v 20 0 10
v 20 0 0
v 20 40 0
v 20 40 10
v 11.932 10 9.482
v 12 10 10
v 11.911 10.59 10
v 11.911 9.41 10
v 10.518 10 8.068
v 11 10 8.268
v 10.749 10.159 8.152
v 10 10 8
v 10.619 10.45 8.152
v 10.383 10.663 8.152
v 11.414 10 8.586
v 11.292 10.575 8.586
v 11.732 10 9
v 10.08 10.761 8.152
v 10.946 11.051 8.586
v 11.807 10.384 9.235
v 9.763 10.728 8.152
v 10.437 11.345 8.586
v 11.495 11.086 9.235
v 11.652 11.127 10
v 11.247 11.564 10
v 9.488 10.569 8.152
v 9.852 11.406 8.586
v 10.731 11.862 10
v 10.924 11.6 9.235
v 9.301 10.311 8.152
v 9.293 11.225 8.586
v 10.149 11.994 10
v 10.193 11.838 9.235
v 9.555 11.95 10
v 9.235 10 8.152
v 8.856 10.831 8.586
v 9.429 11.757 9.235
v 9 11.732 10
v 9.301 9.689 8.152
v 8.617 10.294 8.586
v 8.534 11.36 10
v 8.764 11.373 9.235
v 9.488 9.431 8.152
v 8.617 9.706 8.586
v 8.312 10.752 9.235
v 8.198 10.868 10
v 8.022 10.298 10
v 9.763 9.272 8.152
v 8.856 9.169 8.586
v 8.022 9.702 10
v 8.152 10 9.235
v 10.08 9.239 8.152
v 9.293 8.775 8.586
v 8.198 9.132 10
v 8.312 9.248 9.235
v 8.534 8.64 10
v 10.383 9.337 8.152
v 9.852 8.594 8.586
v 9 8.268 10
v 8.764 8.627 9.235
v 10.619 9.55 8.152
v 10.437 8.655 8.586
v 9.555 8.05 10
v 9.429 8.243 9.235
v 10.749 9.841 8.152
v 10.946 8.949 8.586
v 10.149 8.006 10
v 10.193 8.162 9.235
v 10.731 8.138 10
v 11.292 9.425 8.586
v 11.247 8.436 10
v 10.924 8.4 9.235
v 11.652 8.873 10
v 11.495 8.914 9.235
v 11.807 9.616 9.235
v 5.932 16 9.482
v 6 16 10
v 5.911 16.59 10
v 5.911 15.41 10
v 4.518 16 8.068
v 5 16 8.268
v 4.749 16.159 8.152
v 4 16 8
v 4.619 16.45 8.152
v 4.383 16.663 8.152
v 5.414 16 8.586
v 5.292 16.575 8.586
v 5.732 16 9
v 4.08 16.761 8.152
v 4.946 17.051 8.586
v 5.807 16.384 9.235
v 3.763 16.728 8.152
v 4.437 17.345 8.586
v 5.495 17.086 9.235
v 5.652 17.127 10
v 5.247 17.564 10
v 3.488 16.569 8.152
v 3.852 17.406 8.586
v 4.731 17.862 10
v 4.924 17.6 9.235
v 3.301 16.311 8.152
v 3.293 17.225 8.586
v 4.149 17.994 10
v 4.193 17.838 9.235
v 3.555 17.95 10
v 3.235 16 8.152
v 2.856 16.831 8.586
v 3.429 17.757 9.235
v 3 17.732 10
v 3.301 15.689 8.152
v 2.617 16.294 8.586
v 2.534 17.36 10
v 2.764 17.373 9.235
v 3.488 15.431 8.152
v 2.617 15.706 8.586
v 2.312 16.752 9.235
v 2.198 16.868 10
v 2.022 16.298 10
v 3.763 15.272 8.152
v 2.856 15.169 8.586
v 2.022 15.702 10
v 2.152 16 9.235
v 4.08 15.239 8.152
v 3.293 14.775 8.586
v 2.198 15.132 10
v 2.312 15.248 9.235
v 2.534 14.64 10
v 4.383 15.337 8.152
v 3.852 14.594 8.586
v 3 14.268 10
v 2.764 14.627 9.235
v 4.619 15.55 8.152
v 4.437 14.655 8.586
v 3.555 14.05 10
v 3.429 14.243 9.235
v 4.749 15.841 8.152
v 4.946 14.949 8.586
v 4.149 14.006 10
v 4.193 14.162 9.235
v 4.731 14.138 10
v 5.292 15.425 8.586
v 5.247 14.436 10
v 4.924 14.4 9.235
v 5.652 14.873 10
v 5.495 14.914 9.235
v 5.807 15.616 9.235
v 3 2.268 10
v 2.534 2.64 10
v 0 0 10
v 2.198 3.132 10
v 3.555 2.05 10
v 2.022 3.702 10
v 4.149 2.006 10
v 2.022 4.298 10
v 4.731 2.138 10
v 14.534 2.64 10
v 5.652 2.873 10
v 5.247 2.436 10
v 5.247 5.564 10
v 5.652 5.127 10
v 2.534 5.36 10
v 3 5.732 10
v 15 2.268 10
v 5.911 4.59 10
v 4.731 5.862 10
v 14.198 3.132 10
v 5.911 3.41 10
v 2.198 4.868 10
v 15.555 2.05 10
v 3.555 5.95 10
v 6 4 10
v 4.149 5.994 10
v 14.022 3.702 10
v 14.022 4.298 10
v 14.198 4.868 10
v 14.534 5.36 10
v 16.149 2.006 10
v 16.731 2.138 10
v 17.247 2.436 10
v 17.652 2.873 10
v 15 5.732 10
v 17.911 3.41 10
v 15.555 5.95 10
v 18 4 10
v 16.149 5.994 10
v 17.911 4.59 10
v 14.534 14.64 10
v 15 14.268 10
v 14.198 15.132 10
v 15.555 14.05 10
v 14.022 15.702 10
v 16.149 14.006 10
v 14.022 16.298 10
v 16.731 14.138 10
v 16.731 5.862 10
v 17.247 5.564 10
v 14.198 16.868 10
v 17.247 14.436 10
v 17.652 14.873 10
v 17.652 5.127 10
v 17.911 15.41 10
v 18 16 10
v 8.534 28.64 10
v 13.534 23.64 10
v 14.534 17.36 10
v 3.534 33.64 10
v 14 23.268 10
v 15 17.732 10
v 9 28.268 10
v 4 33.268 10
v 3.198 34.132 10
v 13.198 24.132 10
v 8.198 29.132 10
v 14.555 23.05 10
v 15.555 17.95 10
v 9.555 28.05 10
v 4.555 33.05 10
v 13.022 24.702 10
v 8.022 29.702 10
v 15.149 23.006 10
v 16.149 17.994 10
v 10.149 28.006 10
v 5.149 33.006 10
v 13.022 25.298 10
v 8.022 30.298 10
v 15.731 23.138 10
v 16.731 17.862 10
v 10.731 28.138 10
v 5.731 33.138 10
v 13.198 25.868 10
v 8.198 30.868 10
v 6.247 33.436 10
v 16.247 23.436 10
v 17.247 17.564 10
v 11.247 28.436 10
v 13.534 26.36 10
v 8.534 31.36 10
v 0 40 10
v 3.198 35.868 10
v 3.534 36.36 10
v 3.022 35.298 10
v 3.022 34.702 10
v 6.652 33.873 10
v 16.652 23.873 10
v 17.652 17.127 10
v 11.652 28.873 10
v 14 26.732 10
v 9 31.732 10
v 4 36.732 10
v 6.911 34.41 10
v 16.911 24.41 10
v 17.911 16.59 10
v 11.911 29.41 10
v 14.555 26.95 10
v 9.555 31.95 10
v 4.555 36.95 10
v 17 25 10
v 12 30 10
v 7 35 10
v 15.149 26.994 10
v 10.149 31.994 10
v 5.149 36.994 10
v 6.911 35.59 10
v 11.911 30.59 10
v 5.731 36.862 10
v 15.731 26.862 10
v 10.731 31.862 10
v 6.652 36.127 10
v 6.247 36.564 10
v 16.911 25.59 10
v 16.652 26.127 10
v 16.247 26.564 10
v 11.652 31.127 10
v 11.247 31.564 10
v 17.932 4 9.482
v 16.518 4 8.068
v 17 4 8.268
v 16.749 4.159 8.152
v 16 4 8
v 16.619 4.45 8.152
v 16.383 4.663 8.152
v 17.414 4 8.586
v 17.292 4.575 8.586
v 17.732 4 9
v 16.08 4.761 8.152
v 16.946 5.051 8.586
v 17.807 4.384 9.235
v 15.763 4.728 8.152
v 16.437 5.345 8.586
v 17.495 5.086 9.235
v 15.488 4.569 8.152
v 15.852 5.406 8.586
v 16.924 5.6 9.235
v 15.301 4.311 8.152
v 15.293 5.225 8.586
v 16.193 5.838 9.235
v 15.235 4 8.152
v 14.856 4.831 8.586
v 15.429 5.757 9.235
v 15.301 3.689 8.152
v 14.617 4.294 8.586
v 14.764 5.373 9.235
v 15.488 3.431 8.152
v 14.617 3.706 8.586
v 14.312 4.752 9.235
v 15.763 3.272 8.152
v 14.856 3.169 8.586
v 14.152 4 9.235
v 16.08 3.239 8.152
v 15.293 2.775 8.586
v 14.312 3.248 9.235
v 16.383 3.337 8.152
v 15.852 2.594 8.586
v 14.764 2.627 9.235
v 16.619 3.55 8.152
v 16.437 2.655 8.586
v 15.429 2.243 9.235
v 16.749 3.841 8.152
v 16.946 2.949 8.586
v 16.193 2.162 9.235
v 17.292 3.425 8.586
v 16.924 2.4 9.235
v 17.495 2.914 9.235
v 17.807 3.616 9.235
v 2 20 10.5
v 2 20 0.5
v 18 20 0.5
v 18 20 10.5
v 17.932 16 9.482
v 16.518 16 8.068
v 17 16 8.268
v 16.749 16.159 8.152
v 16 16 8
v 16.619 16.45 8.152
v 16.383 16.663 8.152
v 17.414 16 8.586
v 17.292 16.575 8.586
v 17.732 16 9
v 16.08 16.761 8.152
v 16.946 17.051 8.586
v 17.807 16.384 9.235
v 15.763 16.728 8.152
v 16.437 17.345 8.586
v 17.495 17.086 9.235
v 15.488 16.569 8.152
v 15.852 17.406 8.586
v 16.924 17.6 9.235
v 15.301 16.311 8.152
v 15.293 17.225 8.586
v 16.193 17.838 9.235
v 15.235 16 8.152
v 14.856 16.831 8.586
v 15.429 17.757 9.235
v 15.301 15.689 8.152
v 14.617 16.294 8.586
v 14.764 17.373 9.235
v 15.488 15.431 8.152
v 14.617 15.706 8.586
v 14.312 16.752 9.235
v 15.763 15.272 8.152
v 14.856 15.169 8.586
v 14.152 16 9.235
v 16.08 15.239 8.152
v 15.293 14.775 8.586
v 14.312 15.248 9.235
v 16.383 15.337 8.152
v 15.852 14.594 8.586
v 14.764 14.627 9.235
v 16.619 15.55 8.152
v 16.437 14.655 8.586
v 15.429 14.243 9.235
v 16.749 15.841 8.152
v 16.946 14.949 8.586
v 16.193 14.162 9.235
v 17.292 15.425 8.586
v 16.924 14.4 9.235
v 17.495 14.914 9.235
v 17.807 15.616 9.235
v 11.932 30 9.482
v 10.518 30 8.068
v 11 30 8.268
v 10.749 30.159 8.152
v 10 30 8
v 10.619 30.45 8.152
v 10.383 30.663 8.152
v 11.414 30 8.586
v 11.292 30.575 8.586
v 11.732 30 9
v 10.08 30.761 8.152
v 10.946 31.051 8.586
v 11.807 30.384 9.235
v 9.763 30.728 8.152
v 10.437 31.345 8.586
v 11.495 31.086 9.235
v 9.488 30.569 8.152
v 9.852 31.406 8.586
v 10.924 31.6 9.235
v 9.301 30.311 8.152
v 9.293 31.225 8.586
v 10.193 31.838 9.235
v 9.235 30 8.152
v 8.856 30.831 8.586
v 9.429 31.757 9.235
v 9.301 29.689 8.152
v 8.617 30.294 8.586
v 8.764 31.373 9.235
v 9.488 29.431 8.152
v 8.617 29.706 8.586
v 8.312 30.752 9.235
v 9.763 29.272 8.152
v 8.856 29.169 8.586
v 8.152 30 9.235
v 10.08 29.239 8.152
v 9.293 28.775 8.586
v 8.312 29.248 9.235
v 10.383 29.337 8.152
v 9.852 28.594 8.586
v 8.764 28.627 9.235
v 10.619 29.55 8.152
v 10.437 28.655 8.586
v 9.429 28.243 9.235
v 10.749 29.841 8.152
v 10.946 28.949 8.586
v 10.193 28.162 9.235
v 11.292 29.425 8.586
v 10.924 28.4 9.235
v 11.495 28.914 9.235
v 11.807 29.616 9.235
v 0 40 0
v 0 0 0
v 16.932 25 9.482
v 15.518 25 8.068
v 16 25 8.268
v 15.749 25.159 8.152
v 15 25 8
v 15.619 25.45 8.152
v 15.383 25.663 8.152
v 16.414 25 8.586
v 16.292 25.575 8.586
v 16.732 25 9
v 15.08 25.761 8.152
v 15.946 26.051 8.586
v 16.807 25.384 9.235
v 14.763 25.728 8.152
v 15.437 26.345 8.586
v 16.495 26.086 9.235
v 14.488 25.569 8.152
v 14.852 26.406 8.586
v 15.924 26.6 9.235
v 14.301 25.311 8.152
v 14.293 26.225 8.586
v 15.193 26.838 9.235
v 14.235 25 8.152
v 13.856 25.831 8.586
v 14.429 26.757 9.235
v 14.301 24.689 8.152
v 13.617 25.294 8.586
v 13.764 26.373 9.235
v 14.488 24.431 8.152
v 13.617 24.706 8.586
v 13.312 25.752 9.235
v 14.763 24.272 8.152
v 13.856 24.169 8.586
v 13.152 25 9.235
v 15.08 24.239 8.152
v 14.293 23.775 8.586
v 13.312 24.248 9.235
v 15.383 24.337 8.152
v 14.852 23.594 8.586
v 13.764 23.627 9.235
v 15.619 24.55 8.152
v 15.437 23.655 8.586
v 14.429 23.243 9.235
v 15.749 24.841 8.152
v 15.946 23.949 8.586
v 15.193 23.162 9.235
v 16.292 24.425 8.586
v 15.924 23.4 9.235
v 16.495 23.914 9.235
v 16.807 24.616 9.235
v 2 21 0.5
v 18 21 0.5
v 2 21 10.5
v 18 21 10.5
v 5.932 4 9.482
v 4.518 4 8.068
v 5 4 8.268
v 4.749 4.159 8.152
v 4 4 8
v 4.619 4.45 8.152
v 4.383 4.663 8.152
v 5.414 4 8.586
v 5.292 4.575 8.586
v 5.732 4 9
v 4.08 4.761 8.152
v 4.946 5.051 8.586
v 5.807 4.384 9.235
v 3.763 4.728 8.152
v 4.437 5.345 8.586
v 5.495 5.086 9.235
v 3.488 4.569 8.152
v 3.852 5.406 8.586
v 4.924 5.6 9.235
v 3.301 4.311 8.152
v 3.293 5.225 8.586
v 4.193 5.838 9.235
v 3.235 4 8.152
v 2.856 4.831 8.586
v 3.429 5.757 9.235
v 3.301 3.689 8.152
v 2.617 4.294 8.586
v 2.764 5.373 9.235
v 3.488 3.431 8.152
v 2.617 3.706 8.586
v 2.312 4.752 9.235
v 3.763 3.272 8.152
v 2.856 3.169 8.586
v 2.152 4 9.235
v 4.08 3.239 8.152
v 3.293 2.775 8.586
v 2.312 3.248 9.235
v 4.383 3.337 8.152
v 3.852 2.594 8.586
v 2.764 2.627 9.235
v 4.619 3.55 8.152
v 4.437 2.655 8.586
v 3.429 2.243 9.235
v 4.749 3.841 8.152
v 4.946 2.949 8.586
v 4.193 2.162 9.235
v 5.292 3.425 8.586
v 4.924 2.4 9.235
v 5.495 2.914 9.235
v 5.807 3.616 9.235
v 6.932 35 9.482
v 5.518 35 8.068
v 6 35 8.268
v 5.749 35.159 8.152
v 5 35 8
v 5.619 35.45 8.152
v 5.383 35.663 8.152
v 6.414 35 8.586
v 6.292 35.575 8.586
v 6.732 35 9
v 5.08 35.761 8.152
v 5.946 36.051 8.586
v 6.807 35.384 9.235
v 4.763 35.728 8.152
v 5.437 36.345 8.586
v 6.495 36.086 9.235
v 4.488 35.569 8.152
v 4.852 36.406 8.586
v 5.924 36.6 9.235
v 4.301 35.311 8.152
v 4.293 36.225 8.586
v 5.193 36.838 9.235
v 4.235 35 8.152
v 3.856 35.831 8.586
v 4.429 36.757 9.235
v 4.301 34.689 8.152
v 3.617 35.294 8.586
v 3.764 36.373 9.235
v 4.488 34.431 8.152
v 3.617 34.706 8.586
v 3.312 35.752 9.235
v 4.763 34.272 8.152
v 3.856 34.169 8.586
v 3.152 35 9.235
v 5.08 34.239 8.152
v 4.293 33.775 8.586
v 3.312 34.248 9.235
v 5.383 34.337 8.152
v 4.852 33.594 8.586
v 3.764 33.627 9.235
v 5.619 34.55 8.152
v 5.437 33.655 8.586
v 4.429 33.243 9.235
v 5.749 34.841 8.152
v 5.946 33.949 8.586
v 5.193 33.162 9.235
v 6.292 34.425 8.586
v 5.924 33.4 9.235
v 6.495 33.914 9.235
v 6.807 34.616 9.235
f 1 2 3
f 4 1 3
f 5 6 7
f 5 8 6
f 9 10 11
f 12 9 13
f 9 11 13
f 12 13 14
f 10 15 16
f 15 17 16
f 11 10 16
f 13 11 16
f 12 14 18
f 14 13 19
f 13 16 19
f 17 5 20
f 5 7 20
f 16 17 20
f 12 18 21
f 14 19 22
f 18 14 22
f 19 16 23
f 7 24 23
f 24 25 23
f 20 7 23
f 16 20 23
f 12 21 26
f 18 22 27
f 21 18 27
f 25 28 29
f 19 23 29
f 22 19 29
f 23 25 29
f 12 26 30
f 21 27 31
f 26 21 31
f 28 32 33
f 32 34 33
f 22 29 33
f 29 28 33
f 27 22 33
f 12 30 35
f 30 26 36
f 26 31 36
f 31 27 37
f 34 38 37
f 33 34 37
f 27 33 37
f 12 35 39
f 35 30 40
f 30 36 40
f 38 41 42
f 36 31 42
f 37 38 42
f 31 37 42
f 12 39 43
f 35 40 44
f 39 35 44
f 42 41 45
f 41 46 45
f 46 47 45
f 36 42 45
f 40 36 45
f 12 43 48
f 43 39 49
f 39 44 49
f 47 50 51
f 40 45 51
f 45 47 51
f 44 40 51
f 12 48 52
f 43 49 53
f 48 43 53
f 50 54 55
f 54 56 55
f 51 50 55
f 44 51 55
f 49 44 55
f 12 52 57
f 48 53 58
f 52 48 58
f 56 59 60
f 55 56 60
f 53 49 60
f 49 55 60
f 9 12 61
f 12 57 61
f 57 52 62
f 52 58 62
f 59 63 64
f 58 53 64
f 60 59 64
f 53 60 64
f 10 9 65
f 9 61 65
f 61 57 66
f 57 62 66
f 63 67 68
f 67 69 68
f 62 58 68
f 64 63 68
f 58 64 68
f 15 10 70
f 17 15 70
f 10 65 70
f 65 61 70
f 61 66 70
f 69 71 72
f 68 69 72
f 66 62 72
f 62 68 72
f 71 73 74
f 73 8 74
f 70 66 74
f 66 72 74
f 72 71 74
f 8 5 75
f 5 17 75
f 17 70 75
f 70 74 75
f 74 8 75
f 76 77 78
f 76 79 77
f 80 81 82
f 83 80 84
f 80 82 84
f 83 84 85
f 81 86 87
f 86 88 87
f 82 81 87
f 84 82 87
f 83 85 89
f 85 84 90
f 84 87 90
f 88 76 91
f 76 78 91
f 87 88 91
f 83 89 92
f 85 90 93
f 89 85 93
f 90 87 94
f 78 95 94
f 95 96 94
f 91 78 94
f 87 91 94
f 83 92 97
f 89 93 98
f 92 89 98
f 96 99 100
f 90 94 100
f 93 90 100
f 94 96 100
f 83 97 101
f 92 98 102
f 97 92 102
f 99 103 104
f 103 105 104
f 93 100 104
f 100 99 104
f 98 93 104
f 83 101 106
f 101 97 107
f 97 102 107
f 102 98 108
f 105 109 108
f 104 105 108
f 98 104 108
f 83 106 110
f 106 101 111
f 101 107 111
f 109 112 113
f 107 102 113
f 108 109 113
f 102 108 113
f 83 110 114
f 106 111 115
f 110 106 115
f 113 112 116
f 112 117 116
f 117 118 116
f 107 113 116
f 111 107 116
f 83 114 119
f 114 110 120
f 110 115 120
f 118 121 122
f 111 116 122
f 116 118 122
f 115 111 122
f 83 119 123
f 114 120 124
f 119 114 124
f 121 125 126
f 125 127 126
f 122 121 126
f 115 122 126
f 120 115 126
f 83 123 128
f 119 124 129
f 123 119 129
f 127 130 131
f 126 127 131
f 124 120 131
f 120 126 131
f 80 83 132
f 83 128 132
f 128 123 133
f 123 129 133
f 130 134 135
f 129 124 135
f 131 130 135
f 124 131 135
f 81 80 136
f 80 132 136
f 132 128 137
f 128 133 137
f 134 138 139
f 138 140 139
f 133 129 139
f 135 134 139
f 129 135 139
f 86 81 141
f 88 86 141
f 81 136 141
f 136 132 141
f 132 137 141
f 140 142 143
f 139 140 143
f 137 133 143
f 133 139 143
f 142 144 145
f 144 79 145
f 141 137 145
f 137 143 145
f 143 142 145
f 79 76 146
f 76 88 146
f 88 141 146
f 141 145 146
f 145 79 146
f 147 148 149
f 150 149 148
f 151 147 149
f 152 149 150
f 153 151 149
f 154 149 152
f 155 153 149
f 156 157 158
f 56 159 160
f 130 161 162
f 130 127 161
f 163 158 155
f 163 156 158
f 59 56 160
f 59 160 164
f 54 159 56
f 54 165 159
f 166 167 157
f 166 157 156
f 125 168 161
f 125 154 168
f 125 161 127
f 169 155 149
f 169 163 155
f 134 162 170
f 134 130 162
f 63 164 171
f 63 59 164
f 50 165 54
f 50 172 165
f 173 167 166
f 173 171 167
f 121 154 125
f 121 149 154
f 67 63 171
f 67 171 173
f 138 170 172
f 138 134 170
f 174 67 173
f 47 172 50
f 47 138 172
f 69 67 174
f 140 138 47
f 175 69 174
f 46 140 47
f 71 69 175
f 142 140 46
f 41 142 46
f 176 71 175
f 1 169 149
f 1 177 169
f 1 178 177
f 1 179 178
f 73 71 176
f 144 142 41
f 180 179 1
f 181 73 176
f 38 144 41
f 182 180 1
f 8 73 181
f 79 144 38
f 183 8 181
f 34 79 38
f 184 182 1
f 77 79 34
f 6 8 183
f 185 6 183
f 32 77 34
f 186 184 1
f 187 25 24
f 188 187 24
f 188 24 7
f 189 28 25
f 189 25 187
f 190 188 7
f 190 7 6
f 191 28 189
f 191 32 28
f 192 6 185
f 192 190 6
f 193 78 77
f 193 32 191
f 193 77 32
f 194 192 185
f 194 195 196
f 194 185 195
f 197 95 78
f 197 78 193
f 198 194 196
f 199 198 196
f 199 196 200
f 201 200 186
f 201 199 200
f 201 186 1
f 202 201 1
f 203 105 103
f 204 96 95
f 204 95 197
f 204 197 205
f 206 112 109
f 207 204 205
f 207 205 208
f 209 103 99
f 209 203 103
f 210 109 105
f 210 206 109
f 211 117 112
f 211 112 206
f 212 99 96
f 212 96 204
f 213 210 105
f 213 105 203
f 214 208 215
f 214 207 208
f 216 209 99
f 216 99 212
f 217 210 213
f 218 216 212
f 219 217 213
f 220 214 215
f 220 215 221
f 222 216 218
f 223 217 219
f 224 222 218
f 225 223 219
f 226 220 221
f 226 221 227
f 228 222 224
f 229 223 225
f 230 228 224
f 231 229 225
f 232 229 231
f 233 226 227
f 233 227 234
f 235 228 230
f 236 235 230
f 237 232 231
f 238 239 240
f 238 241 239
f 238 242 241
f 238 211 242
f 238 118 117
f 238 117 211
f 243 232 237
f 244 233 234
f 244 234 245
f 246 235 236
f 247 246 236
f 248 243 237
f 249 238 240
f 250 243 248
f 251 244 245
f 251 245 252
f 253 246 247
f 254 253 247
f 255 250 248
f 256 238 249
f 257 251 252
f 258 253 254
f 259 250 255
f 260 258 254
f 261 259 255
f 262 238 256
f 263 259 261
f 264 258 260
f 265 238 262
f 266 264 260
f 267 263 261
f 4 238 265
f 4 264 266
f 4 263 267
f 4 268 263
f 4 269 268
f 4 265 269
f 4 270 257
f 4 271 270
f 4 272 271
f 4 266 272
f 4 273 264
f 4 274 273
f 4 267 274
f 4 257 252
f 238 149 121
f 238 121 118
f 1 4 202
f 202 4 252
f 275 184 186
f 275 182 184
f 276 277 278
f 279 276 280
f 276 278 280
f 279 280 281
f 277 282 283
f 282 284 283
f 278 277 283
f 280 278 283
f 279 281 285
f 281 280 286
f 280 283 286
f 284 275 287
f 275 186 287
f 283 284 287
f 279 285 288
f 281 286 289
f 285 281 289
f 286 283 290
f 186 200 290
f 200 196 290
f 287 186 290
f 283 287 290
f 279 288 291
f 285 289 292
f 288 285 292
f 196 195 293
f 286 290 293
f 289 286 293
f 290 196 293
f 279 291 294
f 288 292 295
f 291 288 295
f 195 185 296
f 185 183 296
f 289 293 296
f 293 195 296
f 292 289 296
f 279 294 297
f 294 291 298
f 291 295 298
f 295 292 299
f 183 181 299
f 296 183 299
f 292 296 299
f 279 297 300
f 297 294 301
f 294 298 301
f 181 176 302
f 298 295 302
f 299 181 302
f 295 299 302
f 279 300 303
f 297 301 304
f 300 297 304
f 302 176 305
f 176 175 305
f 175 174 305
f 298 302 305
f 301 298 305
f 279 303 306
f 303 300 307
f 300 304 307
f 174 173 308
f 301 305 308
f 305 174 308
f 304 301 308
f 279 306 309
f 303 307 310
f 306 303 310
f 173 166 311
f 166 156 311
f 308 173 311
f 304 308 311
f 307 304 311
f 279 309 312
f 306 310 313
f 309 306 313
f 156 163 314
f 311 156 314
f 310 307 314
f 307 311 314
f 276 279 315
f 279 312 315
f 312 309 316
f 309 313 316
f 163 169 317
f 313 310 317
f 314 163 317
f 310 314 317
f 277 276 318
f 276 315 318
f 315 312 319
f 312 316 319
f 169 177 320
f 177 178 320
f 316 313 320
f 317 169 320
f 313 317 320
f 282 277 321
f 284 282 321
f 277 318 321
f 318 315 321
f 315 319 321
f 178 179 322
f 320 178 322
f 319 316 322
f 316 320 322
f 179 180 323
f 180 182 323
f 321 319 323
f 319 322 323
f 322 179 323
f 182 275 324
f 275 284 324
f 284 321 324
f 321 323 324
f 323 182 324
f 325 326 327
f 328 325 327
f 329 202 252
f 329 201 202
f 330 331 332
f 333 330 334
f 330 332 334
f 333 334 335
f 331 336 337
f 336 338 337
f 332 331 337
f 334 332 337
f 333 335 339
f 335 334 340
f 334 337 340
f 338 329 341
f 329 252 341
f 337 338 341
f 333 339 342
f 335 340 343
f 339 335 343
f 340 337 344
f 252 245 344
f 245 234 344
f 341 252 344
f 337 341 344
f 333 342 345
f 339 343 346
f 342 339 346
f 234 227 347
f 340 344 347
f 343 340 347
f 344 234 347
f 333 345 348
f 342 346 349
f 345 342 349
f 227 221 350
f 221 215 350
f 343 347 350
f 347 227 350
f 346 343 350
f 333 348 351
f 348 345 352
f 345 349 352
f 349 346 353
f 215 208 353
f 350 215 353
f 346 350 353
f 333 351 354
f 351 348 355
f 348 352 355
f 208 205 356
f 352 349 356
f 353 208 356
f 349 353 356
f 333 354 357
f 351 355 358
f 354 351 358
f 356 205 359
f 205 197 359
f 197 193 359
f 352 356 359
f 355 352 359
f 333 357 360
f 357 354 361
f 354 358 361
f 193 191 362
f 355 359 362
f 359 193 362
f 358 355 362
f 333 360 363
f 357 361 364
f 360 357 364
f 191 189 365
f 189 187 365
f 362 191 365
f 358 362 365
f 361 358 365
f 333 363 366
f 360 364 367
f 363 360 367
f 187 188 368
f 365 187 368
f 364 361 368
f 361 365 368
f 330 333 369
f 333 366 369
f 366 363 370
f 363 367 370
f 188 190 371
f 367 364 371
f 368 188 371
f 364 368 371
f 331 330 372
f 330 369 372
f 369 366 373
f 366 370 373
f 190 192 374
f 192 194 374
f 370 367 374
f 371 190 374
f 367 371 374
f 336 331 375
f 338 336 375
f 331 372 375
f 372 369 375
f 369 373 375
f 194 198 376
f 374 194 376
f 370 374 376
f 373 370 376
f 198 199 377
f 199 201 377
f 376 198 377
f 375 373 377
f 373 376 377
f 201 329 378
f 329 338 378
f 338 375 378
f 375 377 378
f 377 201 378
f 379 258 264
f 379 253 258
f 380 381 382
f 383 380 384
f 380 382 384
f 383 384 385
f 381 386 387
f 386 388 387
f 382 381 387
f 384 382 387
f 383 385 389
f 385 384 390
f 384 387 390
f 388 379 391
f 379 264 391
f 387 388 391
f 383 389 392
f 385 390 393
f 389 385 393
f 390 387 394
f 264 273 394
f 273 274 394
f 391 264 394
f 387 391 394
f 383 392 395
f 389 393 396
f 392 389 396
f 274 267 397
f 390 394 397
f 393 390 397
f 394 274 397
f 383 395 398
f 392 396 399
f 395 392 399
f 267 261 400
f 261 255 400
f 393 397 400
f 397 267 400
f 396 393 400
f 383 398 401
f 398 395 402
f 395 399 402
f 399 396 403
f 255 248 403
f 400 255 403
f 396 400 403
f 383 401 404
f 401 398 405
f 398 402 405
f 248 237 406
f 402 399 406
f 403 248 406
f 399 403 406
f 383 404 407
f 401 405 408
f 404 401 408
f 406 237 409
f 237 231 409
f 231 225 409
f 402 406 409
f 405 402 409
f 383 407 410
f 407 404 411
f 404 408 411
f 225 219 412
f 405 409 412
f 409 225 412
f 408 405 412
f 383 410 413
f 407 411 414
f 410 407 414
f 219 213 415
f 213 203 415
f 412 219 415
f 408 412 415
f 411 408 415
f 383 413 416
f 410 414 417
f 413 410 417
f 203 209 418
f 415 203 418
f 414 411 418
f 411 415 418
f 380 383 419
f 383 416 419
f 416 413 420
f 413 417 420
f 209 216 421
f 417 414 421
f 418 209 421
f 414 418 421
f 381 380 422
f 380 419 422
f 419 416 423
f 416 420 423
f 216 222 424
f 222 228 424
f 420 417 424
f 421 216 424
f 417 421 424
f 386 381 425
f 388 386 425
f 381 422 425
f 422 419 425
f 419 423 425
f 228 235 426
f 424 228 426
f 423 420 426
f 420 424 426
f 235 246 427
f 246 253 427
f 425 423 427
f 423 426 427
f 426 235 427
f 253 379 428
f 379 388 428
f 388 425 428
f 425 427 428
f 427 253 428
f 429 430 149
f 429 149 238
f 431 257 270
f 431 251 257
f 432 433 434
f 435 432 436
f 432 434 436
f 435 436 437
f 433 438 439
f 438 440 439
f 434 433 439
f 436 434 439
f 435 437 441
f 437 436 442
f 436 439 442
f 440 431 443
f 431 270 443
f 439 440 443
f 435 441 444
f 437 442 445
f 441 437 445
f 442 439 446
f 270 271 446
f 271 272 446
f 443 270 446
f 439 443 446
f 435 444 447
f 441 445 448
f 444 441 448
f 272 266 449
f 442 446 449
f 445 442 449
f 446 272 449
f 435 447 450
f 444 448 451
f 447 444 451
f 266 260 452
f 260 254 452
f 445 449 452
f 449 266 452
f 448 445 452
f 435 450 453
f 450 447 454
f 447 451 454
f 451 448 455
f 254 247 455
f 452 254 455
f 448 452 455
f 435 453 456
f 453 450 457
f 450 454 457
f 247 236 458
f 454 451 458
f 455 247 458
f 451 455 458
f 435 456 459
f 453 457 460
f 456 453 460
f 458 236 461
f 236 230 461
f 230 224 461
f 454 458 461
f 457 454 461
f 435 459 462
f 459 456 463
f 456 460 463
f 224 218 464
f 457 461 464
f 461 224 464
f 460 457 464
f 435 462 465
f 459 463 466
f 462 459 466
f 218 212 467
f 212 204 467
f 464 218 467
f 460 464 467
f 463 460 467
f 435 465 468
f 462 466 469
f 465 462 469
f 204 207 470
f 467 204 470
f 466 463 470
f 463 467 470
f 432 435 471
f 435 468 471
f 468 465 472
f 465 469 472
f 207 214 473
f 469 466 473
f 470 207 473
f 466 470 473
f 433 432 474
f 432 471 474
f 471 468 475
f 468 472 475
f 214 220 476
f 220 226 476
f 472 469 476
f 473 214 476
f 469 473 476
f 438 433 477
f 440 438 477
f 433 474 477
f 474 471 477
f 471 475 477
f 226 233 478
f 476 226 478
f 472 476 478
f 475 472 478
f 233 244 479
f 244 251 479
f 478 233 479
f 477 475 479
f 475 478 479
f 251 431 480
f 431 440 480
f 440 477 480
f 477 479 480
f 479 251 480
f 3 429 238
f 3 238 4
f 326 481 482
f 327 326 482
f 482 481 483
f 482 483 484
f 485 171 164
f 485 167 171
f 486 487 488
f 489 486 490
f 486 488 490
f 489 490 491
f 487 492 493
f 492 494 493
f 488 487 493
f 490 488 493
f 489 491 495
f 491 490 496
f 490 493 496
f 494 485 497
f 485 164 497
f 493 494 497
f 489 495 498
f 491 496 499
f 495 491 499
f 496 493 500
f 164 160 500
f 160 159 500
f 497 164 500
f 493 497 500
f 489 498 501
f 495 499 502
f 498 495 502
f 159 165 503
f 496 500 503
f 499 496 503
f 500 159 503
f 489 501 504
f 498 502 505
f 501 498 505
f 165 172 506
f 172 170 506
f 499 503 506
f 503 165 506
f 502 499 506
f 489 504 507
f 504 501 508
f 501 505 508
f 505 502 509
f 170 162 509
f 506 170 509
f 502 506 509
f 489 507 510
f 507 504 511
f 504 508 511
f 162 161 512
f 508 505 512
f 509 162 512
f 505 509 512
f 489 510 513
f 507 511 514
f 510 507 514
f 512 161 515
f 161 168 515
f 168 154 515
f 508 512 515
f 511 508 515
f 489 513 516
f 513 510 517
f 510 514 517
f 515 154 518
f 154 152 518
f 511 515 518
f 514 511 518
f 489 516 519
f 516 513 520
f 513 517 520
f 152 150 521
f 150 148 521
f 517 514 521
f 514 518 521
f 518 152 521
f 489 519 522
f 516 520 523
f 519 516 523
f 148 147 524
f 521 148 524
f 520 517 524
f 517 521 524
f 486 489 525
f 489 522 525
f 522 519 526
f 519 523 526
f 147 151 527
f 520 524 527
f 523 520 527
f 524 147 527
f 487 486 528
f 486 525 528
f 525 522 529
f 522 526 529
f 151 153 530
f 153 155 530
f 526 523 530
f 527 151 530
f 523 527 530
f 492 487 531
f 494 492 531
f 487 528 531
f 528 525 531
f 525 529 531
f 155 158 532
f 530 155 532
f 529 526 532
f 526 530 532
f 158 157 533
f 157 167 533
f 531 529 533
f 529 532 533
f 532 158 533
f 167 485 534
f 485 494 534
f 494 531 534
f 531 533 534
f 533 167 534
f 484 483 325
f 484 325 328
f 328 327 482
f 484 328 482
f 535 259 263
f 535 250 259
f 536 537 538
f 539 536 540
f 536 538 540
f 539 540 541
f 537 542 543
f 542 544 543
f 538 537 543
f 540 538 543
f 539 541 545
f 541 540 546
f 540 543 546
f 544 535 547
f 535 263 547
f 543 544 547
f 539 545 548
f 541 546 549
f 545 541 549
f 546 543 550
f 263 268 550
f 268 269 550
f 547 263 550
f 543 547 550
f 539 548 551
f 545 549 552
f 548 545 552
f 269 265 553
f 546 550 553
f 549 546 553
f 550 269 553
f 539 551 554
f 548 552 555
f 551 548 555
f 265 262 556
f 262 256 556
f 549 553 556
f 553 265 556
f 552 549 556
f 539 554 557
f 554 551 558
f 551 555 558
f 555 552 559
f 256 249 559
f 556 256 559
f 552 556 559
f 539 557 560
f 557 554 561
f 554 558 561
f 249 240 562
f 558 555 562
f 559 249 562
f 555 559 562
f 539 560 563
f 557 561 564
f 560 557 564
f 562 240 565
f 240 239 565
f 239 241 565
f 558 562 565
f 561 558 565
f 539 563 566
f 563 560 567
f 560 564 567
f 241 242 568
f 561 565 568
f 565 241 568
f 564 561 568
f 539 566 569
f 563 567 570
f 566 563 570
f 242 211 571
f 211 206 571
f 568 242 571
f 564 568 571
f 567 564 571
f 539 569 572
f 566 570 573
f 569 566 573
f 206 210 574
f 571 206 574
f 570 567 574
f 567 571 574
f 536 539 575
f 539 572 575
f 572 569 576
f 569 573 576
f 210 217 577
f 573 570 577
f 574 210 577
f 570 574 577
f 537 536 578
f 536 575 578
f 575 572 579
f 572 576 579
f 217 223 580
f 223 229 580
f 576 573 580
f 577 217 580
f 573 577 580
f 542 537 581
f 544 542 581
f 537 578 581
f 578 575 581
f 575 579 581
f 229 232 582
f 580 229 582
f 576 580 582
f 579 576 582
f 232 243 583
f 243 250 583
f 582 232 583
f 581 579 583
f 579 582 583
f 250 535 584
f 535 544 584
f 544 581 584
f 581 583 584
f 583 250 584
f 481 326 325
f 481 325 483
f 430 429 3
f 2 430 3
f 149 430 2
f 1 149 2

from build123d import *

# Parameters (mm, degrees)
BOX001_W     = 16
BOX001_H     = 1
BOX001_DEPTH = 10
BOX_W        = 20
BOX_H        = 40
BOX_DEPTH    = 10


with BuildPart() as cub001:
    # Box001 → Box001 (new body)
    with BuildSketch(Plane(origin=(2, 20, 0.5), x_dir=(1, 0, 0), z_dir=(0, 0, 1))):
        with Locations((8, 0.5)):
            Rectangle(BOX001_W, BOX001_H)
    extrude(amount=BOX001_DEPTH)


with BuildPart() as esfera006:
    # Sphere006 → Sphere006 (revolve)
    with BuildSketch(Plane(origin=(15, 25, 10), x_dir=(1, 0, 0), z_dir=(0, -1, 0))):
        with BuildLine():
            ThreePointArc((0, -2), (2, 0), (0, 2))
            Line((0, 2), (0, -2))
        make_face()
    revolve(axis=Axis((15, 25, 10), (0, 0, 1)))


with BuildPart() as esfera007:
    # Sphere007 → Sphere007 (revolve)
    with BuildSketch(Plane(origin=(10, 30, 10), x_dir=(1, 0, 0), z_dir=(0, -1, 0))):
        with BuildLine():
            ThreePointArc((0, -2), (2, 0), (0, 2))
            Line((0, 2), (0, -2))
        make_face()
    revolve(axis=Axis((10, 30, 10), (0, 0, 1)))


with BuildPart() as fusion001:
    # Sphere005 → Sphere005 (revolve)
    with BuildSketch(Plane(origin=(5, 35, 10), x_dir=(1, 0, 0), z_dir=(0, -1, 0))):
        with BuildLine():
            ThreePointArc((0, -2), (2, 0), (0, 2))
            Line((0, 2), (0, -2))
        make_face()
    revolve(axis=Axis((5, 35, 10), (0, 0, 1)))

    # Fusion001: union Esfera006, Esfera007
    add(esfera006.part)
    add(esfera007.part)


with BuildPart() as esfera001:
    # Sphere001 → Sphere001 (revolve)
    with BuildSketch(Plane(origin=(16, 4, 10), x_dir=(1, 0, 0), z_dir=(0, -1, 0))):
        with BuildLine():
            ThreePointArc((0, -2), (2, 0), (0, 2))
            Line((0, 2), (0, -2))
        make_face()
    revolve(axis=Axis((16, 4, 10), (0, 0, 1)))


with BuildPart() as esfera002:
    # Sphere002 → Sphere002 (revolve)
    with BuildSketch(Plane(origin=(4, 16, 10), x_dir=(1, 0, 0), z_dir=(0, -1, 0))):
        with BuildLine():
            ThreePointArc((0, -2), (2, 0), (0, 2))
            Line((0, 2), (0, -2))
        make_face()
    revolve(axis=Axis((4, 16, 10), (0, 0, 1)))


with BuildPart() as esfera003:
    # Sphere003 → Sphere003 (revolve)
    with BuildSketch(Plane(origin=(16, 16, 10), x_dir=(1, 0, 0), z_dir=(0, -1, 0))):
        with BuildLine():
            ThreePointArc((0, -2), (2, 0), (0, 2))
            Line((0, 2), (0, -2))
        make_face()
    revolve(axis=Axis((16, 16, 10), (0, 0, 1)))


with BuildPart() as esfera004:
    # Sphere004 → Sphere004 (revolve)
    with BuildSketch(Plane(origin=(10, 10, 10), x_dir=(1, 0, 0), z_dir=(0, -1, 0))):
        with BuildLine():
            ThreePointArc((0, -2), (2, 0), (0, 2))
            Line((0, 2), (0, -2))
        make_face()
    revolve(axis=Axis((10, 10, 10), (0, 0, 1)))


with BuildPart() as fusion:
    # Sphere → Sphere (revolve)
    with BuildSketch(Plane(origin=(4, 4, 10), x_dir=(1, 0, 0), z_dir=(0, -1, 0))):
        with BuildLine():
            ThreePointArc((0, -2), (2, 0), (0, 2))
            Line((0, 2), (0, -2))
        make_face()
    revolve(axis=Axis((4, 4, 10), (0, 0, 1)))

    # Fusion: union Esfera001, Esfera002, Esfera003, Esfera004
    add(esfera001.part)
    add(esfera002.part)
    add(esfera003.part)
    add(esfera004.part)


with BuildPart() as cut001:
    # Box → Box (new body)
    with BuildSketch(Plane.XY):
        with Locations((10, 20)):
            Rectangle(BOX_W, BOX_H)
    extrude(amount=BOX_DEPTH)

    # Cut: cut Fusion
    add(fusion.part, mode=Mode.SUBTRACT)

    # Cut001: cut Fusion001
    add(fusion001.part, mode=Mode.SUBTRACT)


solid = Compound([cub001.part, cut001.part])
